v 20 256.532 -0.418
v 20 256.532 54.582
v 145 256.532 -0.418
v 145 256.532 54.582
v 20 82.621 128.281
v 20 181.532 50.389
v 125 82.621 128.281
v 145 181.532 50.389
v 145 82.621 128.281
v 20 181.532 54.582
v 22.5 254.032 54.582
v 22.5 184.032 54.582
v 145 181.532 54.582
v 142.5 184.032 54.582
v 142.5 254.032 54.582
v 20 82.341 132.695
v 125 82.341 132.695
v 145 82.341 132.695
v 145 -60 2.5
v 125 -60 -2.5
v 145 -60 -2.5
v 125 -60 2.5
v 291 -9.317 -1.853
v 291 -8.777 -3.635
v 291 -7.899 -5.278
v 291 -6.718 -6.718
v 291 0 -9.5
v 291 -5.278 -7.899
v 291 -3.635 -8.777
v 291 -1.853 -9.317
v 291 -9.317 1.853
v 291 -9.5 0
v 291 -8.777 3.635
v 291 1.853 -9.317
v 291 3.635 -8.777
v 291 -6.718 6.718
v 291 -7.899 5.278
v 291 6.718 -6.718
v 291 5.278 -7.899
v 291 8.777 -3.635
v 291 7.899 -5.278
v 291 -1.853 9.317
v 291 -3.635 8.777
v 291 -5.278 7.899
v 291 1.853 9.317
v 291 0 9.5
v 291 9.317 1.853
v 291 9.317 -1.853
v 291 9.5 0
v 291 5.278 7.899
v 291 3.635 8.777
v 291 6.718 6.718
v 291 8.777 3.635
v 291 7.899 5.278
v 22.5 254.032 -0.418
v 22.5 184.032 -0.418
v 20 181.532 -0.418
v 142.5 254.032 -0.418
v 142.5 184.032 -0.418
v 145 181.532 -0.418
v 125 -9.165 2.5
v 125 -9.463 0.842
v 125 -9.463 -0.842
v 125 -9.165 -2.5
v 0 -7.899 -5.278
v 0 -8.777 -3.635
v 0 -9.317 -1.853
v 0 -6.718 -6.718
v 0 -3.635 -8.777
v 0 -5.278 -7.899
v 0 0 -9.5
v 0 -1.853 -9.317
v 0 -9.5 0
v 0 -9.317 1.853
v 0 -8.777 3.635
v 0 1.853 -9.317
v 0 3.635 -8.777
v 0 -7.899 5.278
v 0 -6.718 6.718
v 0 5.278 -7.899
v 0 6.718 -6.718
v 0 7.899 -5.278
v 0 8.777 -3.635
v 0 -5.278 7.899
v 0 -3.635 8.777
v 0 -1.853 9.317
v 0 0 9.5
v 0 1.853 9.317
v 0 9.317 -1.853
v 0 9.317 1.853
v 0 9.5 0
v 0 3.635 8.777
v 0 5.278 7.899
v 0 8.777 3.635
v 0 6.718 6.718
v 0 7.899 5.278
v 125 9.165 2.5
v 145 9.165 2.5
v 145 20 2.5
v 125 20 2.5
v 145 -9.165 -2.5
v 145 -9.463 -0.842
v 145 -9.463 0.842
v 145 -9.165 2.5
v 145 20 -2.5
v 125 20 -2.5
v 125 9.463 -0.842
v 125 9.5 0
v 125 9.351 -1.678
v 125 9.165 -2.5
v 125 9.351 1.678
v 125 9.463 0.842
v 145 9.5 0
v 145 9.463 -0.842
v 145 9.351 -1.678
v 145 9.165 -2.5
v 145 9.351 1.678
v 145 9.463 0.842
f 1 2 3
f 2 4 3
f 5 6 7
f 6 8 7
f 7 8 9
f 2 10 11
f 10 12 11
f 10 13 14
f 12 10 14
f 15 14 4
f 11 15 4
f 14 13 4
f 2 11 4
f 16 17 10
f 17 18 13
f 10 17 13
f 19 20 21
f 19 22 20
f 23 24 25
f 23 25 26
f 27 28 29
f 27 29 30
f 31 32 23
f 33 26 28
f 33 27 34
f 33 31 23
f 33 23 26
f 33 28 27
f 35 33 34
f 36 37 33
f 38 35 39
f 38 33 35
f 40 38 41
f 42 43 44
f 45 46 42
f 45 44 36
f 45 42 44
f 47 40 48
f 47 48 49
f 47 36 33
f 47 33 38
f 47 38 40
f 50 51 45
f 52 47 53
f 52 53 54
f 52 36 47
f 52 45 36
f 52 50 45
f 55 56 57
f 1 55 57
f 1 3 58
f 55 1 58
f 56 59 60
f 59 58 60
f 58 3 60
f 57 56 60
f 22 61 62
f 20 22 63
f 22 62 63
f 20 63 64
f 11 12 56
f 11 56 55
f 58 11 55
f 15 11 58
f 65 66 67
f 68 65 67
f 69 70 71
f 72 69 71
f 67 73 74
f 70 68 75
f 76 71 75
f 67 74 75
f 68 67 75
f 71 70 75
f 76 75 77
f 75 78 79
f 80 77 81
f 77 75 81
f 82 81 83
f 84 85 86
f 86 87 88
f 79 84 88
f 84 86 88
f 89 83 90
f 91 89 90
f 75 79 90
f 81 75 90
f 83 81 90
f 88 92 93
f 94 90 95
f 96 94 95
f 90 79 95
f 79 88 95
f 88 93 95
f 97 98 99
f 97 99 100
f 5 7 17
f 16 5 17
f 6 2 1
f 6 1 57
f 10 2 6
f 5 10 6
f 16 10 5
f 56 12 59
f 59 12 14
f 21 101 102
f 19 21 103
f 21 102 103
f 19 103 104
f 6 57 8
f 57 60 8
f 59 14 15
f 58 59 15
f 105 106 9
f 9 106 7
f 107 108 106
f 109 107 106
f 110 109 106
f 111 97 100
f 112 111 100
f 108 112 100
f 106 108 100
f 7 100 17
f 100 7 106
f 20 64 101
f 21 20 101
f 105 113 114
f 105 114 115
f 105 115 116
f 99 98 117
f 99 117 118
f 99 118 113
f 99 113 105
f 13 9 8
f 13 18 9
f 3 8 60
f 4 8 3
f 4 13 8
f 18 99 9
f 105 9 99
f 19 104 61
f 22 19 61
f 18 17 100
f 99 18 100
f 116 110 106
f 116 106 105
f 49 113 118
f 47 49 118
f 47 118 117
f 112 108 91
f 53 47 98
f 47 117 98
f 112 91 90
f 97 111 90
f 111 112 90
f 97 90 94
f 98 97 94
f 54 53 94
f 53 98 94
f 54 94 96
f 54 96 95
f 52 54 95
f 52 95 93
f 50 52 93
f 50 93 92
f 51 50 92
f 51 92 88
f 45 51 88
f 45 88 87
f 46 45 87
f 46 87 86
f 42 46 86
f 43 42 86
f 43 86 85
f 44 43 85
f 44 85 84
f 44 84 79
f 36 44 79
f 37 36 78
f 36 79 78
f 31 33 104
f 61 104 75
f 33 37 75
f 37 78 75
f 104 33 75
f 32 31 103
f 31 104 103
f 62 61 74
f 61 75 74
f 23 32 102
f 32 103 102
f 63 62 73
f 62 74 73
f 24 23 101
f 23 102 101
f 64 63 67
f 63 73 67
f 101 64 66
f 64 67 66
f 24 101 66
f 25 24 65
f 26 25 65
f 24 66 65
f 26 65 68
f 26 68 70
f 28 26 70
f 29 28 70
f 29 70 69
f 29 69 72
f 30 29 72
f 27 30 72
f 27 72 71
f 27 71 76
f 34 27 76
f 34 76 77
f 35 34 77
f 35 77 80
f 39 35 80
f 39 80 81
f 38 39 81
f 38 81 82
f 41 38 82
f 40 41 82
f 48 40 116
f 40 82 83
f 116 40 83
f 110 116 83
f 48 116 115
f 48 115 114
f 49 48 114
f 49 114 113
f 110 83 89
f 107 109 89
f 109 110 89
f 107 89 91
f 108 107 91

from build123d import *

# Parameters (mm, degrees)
F0_R      = 9.5
F1_DEPTH  = 291
F3_DEPTH  = 60
F4_DEPTH  = 20
F7_DEPTH  = 20
F8_DEPTH  = 20
F10_DEPTH = 105
F11_W     = 120
F11_H     = 70
F12_DEPTH = 149.5


with BuildPart() as f1:
    # F0 (on Right) → F1 (new body)
    with BuildSketch(Plane.YZ):
        Circle(F0_R)
    extrude(amount=F1_DEPTH)

    # F2 (on Front) → F3 (join)
    with BuildSketch(Plane.XZ):
        Polygon((125, -2.5), (145, -2.5), (145, 2.5), (125, 2.5), (125, 0), align=None)
    extrude(amount=F3_DEPTH)

    # F2 (on Front) → F4 (join)
    with BuildSketch(Plane.XZ):
        Polygon((125, -2.5), (145, -2.5), (145, 2.5), (125, 2.5), (125, 0), align=None)
    extrude(amount=-F4_DEPTH)

    # F6 (on offset) → F7 (join)
    with BuildSketch(Plane.YZ.offset(125)):
        Polygon((20, 2.5), (20, 0), (20, -2.5), (82.621394, 128.280584), (82.341, 132.695), align=None)
    extrude(amount=F7_DEPTH)

    # F6 (on offset) → F8 (join)
    with BuildSketch(Plane.YZ.offset(125)):
        Polygon((20, 2.5), (20, 0), (20, -2.5), (82.621394, 128.280584), (82.341, 132.695), align=None)
        Polygon((181.532421, 54.58217), (82.341, 132.695), (82.621394, 128.280584), (181.532421, 50.388562), align=None)
        Polygon((256.532421, 54.58217), (181.532421, 54.58217), (181.532421, 50.388562), (181.532421, -0.41783), (256.532421, -0.41783), align=None)
    extrude(amount=F8_DEPTH)

    # F9 (on face) → F10 (join)
    with BuildSketch(Plane(origin=(125, 0, 0), x_dir=(0, -1, 0), z_dir=(-1, 0, 0))):
        Polygon((-181.532421, 54.58217), (-256.532421, 54.58217), (-256.532421, -0.41783), (-181.532421, -0.41783), (-181.532421, 50.388562), align=None)
        Polygon((-82.341, 132.695), (-181.532421, 54.58217), (-181.532421, 50.388562), (-82.621394, 128.280584), align=None)
    extrude(amount=F10_DEPTH)

    # F11 (on face) → F12 (cut)
    with BuildSketch(Plane.XY.offset(54.58217)):
        with Locations((82.5, 219.032421)):
            Rectangle(F11_W, F11_H)
    extrude(amount=-F12_DEPTH, mode=Mode.SUBTRACT)


solid = f1.part
